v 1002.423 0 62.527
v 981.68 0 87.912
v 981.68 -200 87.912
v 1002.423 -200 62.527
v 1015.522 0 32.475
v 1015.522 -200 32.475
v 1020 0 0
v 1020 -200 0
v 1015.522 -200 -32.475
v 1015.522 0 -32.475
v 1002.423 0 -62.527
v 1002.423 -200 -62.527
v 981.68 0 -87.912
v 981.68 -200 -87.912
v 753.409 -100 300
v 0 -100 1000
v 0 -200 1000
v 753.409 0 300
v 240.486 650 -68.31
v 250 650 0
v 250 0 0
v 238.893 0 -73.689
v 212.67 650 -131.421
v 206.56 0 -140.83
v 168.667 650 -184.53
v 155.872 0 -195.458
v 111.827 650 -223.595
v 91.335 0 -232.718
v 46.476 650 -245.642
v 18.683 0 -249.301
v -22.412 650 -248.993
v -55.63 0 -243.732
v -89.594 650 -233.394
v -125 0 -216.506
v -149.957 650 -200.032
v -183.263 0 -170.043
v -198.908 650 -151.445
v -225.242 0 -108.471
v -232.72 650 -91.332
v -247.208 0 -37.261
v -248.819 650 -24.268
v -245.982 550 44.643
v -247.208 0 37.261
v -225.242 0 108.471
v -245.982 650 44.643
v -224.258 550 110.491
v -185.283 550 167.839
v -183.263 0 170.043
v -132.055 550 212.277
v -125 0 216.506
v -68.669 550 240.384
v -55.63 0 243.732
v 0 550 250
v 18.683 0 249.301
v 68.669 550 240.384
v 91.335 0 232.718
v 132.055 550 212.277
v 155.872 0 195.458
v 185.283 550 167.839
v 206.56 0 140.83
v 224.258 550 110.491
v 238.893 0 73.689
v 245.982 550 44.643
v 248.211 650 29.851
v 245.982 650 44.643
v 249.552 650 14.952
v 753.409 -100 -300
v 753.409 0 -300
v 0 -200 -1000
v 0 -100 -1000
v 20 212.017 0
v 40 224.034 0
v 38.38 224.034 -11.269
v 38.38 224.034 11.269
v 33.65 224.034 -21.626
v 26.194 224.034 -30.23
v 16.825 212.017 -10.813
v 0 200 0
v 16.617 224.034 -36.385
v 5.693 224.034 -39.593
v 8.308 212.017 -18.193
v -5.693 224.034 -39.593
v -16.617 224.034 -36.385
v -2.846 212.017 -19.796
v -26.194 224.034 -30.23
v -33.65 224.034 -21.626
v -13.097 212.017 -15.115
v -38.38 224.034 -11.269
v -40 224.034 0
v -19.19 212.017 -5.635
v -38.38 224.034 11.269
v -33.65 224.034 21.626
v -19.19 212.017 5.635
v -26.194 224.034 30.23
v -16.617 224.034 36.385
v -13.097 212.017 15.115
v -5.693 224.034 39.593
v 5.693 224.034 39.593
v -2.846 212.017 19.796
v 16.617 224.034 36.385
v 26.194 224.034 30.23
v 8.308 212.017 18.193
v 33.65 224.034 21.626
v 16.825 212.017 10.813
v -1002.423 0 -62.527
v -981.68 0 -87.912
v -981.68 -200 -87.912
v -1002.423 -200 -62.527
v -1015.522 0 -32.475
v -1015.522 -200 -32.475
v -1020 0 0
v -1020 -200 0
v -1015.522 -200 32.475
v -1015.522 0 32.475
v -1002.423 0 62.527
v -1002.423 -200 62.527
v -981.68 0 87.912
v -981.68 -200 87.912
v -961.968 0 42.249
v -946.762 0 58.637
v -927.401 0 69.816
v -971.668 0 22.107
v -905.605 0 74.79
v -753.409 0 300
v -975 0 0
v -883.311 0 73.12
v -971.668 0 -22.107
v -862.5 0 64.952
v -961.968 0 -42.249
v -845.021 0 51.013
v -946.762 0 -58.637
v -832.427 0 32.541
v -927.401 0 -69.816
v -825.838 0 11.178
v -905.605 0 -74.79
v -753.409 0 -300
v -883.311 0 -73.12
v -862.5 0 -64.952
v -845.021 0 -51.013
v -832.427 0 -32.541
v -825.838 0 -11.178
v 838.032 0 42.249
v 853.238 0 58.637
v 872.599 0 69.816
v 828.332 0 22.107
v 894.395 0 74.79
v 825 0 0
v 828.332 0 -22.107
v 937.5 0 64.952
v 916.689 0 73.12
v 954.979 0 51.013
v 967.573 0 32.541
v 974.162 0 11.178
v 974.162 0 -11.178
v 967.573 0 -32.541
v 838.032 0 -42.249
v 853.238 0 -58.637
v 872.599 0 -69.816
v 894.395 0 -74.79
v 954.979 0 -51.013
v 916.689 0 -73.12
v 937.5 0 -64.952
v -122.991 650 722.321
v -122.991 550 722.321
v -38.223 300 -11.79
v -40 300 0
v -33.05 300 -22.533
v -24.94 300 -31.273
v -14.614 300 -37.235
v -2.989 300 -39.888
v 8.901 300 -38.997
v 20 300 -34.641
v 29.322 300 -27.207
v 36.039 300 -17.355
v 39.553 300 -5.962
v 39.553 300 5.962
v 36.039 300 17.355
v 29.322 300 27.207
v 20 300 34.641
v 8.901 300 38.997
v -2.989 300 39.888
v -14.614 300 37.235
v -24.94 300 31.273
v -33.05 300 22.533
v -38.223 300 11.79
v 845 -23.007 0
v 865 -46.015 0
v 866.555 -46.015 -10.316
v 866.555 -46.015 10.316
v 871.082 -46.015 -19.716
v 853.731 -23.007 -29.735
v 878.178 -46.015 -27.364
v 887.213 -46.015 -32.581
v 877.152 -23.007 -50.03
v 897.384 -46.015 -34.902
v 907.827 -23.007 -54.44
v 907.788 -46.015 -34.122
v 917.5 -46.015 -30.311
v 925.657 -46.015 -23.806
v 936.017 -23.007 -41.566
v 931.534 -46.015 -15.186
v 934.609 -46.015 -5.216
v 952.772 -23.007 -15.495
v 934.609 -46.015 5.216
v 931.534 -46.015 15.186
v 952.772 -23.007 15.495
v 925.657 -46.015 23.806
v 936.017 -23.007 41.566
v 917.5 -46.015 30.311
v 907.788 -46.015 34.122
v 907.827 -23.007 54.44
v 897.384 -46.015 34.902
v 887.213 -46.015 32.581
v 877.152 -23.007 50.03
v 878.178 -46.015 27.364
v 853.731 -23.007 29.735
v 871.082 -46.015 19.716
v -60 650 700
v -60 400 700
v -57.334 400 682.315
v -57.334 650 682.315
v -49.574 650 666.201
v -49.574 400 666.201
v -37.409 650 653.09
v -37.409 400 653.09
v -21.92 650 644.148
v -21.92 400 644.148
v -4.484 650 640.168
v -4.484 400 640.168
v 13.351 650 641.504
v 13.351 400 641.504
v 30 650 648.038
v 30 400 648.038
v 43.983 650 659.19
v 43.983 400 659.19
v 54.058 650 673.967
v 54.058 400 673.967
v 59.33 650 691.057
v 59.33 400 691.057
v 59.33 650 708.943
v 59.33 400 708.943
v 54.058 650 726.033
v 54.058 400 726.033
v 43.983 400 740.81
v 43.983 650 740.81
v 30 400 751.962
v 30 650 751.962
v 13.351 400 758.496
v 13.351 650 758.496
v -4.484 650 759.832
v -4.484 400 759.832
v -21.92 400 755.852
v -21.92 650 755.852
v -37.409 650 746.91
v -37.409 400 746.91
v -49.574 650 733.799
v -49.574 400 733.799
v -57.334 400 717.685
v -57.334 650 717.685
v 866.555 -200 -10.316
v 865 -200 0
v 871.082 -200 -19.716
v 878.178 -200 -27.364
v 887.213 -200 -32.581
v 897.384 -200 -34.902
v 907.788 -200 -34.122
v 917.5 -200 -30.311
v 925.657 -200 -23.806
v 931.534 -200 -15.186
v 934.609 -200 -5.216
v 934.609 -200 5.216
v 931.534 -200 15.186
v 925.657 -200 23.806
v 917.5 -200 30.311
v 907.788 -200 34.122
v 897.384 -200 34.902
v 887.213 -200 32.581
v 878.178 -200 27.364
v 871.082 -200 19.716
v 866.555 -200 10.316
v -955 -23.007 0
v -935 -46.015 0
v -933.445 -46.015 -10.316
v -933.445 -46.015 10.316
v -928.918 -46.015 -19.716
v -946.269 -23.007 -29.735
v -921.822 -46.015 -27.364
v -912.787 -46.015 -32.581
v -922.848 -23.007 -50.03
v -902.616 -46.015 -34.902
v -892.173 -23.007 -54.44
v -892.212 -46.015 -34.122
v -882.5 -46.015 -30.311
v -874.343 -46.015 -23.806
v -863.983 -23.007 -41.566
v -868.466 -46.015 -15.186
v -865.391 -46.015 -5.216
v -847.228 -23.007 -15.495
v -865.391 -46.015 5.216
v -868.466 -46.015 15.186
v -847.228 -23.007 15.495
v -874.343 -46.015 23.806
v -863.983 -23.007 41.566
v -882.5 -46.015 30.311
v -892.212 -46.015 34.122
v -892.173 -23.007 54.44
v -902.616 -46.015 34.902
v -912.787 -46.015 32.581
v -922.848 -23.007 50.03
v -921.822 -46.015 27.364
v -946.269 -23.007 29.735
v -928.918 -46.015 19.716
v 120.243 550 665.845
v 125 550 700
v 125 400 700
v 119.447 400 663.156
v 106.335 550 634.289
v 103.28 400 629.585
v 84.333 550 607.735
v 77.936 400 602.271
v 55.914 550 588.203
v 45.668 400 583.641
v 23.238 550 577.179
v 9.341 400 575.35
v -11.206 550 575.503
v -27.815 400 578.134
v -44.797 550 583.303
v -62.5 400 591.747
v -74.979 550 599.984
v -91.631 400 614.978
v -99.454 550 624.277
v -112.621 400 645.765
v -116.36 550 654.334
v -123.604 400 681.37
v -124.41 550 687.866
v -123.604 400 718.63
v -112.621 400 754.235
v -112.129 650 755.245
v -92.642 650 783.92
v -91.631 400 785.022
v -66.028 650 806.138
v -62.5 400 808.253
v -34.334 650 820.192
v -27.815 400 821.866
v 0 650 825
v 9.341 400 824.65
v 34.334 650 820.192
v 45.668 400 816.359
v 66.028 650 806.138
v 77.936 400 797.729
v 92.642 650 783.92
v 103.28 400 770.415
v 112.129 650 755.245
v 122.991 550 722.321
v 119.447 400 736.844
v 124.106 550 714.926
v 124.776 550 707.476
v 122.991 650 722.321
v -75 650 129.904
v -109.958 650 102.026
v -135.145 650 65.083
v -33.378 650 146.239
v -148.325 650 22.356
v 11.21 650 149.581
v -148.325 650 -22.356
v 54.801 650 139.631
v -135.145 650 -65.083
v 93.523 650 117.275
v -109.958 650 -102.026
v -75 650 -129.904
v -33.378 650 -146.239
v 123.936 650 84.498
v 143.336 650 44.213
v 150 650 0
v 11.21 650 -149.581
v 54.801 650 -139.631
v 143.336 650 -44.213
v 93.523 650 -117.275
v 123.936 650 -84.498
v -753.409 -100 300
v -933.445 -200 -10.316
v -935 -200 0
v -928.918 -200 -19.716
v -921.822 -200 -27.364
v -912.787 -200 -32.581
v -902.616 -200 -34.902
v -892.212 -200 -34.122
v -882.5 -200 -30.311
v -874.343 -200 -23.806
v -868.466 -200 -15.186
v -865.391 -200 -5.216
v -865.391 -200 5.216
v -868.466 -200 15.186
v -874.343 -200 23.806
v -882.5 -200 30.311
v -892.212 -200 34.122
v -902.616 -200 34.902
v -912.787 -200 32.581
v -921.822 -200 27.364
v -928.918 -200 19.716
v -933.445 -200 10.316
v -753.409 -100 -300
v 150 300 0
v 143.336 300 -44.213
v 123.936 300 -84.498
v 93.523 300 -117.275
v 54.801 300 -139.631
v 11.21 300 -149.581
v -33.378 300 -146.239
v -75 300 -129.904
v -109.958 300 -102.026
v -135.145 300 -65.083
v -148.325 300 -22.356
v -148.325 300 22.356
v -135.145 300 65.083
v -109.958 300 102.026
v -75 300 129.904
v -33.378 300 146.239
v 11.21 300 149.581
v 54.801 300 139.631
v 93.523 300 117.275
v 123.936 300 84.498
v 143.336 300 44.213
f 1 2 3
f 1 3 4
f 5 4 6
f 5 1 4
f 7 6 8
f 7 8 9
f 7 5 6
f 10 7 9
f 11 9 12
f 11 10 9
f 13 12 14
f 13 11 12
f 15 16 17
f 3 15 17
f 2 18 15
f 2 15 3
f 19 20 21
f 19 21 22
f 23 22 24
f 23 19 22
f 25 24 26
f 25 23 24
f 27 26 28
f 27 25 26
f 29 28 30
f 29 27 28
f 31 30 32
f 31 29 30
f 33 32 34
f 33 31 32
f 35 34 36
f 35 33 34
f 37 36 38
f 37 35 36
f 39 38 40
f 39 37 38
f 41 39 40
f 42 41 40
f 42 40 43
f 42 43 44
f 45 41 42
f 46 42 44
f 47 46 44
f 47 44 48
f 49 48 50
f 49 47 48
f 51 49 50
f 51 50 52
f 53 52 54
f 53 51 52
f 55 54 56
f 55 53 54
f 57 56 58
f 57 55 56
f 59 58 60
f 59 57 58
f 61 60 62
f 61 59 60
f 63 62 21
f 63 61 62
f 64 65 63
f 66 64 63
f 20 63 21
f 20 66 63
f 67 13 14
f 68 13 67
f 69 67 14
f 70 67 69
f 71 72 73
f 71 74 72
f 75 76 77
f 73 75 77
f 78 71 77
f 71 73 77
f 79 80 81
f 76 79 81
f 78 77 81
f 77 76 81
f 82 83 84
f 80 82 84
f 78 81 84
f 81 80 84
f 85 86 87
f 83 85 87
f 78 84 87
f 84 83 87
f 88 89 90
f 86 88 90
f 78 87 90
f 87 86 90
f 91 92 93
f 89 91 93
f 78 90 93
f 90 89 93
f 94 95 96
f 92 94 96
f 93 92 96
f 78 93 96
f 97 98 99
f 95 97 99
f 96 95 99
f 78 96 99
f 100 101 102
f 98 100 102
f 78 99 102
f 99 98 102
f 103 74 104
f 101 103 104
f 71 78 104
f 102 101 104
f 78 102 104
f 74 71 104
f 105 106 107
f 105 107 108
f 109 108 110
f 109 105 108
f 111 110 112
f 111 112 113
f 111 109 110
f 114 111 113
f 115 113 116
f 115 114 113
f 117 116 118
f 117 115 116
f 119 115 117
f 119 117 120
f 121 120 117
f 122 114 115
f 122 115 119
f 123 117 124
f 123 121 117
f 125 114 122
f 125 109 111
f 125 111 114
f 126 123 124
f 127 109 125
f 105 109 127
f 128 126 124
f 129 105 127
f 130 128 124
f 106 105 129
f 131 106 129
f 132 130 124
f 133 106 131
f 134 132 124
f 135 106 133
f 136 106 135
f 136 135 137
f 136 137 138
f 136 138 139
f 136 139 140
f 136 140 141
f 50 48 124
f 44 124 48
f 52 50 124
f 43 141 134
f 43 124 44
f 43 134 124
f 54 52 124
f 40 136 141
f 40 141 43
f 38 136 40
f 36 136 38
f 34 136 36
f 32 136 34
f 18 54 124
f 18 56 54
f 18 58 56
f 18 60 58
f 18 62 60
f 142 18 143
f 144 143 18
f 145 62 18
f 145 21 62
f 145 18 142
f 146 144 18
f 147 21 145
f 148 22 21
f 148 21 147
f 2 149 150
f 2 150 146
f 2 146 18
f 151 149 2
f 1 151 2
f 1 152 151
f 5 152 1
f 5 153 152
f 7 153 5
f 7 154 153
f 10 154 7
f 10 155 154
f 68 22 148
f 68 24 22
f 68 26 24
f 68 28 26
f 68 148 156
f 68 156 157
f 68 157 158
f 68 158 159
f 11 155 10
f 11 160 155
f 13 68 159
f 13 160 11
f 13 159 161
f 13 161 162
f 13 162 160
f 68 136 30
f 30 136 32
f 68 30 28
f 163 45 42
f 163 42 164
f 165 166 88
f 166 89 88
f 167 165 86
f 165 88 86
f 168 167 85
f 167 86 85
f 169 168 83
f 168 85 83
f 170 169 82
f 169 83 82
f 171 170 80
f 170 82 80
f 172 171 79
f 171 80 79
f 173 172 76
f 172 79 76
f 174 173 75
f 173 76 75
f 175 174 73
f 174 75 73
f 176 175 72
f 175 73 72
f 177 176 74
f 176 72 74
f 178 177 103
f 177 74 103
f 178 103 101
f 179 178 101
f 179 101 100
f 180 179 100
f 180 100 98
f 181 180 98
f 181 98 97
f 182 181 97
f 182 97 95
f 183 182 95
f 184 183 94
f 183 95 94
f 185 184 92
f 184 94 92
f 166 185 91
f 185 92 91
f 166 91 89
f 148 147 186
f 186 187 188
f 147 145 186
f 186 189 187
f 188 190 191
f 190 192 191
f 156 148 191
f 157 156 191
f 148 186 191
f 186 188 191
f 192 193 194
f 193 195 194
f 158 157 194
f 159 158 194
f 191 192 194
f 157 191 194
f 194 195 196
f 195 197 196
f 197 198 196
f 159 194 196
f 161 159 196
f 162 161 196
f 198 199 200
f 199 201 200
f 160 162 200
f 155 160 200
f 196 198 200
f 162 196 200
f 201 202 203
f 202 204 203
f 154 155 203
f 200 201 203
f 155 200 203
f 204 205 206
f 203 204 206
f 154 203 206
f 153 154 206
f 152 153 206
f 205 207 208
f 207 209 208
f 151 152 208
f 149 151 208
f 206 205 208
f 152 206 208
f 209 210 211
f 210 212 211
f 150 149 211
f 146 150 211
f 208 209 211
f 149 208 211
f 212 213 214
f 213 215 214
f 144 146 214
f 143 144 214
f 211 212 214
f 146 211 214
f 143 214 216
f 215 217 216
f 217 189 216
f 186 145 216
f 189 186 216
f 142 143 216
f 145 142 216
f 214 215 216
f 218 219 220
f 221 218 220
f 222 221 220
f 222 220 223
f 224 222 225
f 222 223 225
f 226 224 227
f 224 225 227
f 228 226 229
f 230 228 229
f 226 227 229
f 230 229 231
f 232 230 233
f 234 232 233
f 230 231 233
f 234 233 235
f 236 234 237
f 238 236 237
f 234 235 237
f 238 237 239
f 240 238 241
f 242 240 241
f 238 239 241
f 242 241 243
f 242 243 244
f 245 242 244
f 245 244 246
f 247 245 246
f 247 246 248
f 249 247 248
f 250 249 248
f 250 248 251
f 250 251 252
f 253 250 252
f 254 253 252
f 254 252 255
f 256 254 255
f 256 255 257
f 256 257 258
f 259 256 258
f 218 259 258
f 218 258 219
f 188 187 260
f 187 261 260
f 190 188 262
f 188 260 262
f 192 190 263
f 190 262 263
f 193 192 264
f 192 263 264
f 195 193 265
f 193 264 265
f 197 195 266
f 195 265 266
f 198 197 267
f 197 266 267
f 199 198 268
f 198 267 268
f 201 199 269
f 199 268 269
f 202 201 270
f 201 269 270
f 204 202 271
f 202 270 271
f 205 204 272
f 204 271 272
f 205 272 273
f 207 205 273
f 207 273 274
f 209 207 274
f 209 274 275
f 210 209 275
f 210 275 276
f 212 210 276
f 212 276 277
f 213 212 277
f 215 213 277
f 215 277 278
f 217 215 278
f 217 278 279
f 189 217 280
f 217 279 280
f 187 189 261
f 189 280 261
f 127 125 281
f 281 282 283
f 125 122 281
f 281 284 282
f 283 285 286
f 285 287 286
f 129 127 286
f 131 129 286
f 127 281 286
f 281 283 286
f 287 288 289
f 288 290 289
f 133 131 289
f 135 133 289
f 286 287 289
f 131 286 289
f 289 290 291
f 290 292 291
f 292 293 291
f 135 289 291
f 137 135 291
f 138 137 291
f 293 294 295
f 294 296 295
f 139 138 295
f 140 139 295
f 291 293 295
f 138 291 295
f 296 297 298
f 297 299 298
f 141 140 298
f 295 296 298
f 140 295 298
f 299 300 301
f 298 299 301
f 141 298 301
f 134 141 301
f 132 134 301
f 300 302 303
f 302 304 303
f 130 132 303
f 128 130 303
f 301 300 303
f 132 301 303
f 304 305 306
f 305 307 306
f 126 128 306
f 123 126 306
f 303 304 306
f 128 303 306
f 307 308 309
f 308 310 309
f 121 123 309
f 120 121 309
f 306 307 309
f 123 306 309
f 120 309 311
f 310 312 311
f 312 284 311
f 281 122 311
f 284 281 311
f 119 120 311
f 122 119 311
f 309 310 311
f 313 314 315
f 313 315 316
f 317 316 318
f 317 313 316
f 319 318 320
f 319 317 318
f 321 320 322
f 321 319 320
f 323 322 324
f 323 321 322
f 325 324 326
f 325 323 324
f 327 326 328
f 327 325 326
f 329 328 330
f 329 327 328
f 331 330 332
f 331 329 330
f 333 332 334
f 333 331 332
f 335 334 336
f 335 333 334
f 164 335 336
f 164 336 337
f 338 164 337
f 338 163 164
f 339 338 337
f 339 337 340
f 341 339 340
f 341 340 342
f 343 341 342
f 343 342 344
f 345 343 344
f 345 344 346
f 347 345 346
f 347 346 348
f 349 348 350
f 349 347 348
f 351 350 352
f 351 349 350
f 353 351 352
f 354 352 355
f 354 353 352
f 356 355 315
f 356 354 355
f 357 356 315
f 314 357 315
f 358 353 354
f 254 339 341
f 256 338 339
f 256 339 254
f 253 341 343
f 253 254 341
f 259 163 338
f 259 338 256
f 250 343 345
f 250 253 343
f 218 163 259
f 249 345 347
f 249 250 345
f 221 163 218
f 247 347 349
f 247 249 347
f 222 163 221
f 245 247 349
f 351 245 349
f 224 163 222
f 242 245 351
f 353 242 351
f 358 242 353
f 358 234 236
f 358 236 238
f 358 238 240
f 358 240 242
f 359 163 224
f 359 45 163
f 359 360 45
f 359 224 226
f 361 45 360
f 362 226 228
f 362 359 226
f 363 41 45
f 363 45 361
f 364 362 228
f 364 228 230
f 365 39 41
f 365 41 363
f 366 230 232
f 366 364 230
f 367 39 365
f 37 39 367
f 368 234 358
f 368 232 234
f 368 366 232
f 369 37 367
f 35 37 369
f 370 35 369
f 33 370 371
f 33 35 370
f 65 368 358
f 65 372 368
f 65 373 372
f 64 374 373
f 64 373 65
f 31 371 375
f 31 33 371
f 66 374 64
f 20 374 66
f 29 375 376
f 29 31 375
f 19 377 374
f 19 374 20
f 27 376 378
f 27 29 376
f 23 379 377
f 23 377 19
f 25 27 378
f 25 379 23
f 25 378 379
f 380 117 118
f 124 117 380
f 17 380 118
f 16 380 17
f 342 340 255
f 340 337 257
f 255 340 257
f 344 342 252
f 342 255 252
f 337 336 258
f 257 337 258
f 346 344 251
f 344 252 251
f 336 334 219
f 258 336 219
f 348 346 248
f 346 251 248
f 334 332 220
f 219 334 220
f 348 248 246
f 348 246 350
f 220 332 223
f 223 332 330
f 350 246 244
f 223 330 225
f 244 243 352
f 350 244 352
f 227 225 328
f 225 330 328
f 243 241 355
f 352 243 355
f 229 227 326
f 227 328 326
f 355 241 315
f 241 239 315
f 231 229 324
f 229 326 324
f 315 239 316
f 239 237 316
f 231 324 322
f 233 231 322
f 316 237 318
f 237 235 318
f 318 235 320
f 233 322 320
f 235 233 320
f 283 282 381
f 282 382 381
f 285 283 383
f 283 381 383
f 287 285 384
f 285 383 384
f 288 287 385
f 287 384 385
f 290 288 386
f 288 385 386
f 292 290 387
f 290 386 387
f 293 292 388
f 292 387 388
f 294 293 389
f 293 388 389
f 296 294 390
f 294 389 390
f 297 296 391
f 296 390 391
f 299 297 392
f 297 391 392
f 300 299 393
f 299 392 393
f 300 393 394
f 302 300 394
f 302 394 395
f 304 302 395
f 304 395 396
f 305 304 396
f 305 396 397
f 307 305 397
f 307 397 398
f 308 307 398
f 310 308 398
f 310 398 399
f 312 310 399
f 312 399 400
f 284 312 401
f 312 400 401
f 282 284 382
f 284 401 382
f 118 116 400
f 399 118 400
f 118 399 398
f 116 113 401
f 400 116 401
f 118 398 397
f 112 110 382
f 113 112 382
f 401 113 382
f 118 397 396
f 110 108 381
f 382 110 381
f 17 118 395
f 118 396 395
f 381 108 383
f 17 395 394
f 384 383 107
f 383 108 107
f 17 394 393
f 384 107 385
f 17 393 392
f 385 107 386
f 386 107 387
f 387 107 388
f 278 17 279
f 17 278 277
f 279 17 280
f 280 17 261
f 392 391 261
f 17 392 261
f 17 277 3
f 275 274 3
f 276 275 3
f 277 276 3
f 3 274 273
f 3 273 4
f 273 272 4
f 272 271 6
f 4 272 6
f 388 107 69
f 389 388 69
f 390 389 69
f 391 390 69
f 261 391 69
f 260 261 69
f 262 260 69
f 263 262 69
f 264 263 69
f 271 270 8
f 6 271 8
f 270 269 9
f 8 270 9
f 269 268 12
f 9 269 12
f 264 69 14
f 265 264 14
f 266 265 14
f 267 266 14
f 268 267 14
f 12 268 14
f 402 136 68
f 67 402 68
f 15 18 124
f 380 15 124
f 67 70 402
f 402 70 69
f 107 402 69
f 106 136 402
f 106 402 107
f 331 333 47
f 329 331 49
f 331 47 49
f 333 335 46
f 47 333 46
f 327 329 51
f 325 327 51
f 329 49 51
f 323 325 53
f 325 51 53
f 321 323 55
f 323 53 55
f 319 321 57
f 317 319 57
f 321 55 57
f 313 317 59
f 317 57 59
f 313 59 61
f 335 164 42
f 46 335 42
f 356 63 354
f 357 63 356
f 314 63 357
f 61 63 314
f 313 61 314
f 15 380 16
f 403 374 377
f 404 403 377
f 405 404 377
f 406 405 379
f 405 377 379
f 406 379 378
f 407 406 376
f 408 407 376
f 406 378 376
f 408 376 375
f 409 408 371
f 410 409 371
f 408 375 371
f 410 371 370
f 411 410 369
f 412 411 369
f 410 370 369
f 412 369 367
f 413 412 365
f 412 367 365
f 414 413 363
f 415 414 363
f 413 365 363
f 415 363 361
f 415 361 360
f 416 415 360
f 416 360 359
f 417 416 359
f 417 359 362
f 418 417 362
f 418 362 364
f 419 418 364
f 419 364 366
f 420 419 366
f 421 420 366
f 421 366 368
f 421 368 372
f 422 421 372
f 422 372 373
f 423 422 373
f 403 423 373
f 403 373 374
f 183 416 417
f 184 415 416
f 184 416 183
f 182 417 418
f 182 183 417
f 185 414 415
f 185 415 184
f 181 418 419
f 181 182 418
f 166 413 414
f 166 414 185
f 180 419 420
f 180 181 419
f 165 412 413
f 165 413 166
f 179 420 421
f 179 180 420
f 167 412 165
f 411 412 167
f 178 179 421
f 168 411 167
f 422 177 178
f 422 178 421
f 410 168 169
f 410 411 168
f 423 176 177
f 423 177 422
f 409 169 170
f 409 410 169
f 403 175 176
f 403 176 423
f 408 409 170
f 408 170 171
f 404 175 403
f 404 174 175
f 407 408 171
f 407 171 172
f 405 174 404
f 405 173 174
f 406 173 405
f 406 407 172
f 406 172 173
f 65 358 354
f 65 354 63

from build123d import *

# Parameters (mm, degrees)
SKETCH2_R                                           = 250
BOSS_EXTRUDE1_DEPTH                                 = 650
BOSS_EXTRUDE1_DEPTH_BACK                            = 200
SKETCH2_3_R                                         = 250
BOSS_EXTRUDE2_DEPTH                                 = 200
CUT_EXTRUDE1_DEPTH                                  = 100
BOSS_EXTRUDE4_DEPTH                                 = 100
SKETCH3_3_R                                         = 125
BOSS_EXTRUDE5_DEPTH                                 = 250
CSK_FOR_0_FLAT_HEAD_MACHINE_SCREW1_D                = 69.999999954
CSK_FOR_0_FLAT_HEAD_MACHINE_SCREW1_CSINK_D          = 149.999999974
CSK_FOR_0_FLAT_HEAD_MACHINE_SCREW1_CSINK_ANGLE      = 82
CBORE_FOR_0_BINDING_HEAD_MACHINE_SCREW1_D           = 80.00000002
CBORE_FOR_0_BINDING_HEAD_MACHINE_SCREW1_DEPTH       = 425.965575233
CBORE_FOR_0_BINDING_HEAD_MACHINE_SCREW1_CBORE_D     = 299.999999948
CBORE_FOR_0_BINDING_HEAD_MACHINE_SCREW1_CBORE_DEPTH = 350.000000024
CBORE_FOR_0_BINDING_HEAD_MACHINE_SCREW1_TIP         = 24.034424767
HOLE1_D                                             = 120
HOLE1_DEPTH                                         = 250


with BuildPart() as part:
    # Sketch2 → Boss-Extrude1 (new body, two sides)
    with BuildSketch(Plane(origin=(0, 0, 0), x_dir=(1, 0, 0), z_dir=(0, 1, 0))) as boss_extrude1_sk:
        Circle(SKETCH2_R)
    extrude(amount=BOSS_EXTRUDE1_DEPTH)
    extrude(boss_extrude1_sk.sketch, amount=-BOSS_EXTRUDE1_DEPTH_BACK)

    # Sketch2<3> → Boss-Extrude2 (add)
    with BuildSketch(Plane(origin=(0, 0, 0), x_dir=(1, 0, 0), z_dir=(0, 1, 0))):
        with BuildLine():
            Line((0, -1000), (981.679558011, -87.91160221))
            ThreePointArc((981.679558011, -87.91160221), (1020, 0), (981.679558011, 87.91160221))
            Line((981.679558011, 87.91160221), (0, 1000))
            Line((0, 1000), (-981.679558011, 87.91160221))
            ThreePointArc((-981.679558011, 87.91160221), (-1020, 0), (-981.679558011, -87.91160221))
            Line((-981.679558011, -87.91160221), (0, -1000))
        make_face()
        Circle(SKETCH2_3_R, mode=Mode.SUBTRACT)
    extrude(amount=-BOSS_EXTRUDE2_DEPTH)

    # Sketch2<5> → Cut-Extrude1 (cut)
    with BuildSketch(Plane(origin=(0, 0, 0), x_dir=(1, 0, 0), z_dir=(0, 1, 0))):
        Polygon((-753.409090909, -300), (0, -1000), (753.409090909, -300), align=None)
        Polygon((753.409090909, 300), (0, 1000), (-753.409090909, 300), align=None)
    extrude(amount=-CUT_EXTRUDE1_DEPTH, mode=Mode.SUBTRACT)

    # Sketch3 → Boss-Extrude4 (add)
    with BuildSketch(Plane(origin=(0, 650, 0), x_dir=(1, 0, 0), z_dir=(0, 1, 0))):
        with BuildLine():
            ThreePointArc((245.981737749, -44.642857143), (0, -250), (-245.981737749, -44.642857143))
            Line((-245.981737749, -44.642857143), (-122.990868875, -722.321428571))
            ThreePointArc((-122.990868875, -722.321428571), (-11.205833094, -575.503296009), (125, -700))
            ThreePointArc((125, -700), (124.496703991, -711.205833094), (122.990868875, -722.321428571))
            Line((122.990868875, -722.321428571), (245.981737749, -44.642857143))
        make_face()
    extrude(amount=-BOSS_EXTRUDE4_DEPTH)

    # Sketch3<3> → Boss-Extrude5 (add)
    with BuildSketch(Plane(origin=(0, 650, 0), x_dir=(1, 0, 0), z_dir=(0, 1, 0))):
        with Locations((0, -700)):
            Circle(SKETCH3_3_R)
    extrude(amount=-BOSS_EXTRUDE5_DEPTH)

    # CSK for #0 Flat Head Machine Screw1 (through all)
    with Locations(Plane(origin=(0, 0, 0), x_dir=(1, 0, 0), z_dir=(0, 1, 0))):
        with Locations((900, 0), (-900, 0)):
            CounterSinkHole(CSK_FOR_0_FLAT_HEAD_MACHINE_SCREW1_D / 2, CSK_FOR_0_FLAT_HEAD_MACHINE_SCREW1_CSINK_D / 2, counter_sink_angle=CSK_FOR_0_FLAT_HEAD_MACHINE_SCREW1_CSINK_ANGLE)

    # CBORE for #0 Binding Head Machine Screw1
    with Locations(Plane(origin=(0, 650, 0), x_dir=(1, 0, 0), z_dir=(0, 1, 0))):
        with Locations((0, 0)):
            CounterBoreHole(CBORE_FOR_0_BINDING_HEAD_MACHINE_SCREW1_D / 2, CBORE_FOR_0_BINDING_HEAD_MACHINE_SCREW1_CBORE_D / 2, CBORE_FOR_0_BINDING_HEAD_MACHINE_SCREW1_CBORE_DEPTH, depth=CBORE_FOR_0_BINDING_HEAD_MACHINE_SCREW1_DEPTH)
            with Locations((0, 0, -(CBORE_FOR_0_BINDING_HEAD_MACHINE_SCREW1_DEPTH + CBORE_FOR_0_BINDING_HEAD_MACHINE_SCREW1_TIP / 2))):  # 118° drill point
                Cone(0, CBORE_FOR_0_BINDING_HEAD_MACHINE_SCREW1_D / 2, CBORE_FOR_0_BINDING_HEAD_MACHINE_SCREW1_TIP, mode=Mode.SUBTRACT)

    # Hole1
    with Locations(Plane(origin=(0, 650, 0), x_dir=(1, 0, 0), z_dir=(0, 1, 0))):
        with Locations((0, -700)):
            Hole(HOLE1_D / 2, depth=HOLE1_DEPTH)


solid = part.part
